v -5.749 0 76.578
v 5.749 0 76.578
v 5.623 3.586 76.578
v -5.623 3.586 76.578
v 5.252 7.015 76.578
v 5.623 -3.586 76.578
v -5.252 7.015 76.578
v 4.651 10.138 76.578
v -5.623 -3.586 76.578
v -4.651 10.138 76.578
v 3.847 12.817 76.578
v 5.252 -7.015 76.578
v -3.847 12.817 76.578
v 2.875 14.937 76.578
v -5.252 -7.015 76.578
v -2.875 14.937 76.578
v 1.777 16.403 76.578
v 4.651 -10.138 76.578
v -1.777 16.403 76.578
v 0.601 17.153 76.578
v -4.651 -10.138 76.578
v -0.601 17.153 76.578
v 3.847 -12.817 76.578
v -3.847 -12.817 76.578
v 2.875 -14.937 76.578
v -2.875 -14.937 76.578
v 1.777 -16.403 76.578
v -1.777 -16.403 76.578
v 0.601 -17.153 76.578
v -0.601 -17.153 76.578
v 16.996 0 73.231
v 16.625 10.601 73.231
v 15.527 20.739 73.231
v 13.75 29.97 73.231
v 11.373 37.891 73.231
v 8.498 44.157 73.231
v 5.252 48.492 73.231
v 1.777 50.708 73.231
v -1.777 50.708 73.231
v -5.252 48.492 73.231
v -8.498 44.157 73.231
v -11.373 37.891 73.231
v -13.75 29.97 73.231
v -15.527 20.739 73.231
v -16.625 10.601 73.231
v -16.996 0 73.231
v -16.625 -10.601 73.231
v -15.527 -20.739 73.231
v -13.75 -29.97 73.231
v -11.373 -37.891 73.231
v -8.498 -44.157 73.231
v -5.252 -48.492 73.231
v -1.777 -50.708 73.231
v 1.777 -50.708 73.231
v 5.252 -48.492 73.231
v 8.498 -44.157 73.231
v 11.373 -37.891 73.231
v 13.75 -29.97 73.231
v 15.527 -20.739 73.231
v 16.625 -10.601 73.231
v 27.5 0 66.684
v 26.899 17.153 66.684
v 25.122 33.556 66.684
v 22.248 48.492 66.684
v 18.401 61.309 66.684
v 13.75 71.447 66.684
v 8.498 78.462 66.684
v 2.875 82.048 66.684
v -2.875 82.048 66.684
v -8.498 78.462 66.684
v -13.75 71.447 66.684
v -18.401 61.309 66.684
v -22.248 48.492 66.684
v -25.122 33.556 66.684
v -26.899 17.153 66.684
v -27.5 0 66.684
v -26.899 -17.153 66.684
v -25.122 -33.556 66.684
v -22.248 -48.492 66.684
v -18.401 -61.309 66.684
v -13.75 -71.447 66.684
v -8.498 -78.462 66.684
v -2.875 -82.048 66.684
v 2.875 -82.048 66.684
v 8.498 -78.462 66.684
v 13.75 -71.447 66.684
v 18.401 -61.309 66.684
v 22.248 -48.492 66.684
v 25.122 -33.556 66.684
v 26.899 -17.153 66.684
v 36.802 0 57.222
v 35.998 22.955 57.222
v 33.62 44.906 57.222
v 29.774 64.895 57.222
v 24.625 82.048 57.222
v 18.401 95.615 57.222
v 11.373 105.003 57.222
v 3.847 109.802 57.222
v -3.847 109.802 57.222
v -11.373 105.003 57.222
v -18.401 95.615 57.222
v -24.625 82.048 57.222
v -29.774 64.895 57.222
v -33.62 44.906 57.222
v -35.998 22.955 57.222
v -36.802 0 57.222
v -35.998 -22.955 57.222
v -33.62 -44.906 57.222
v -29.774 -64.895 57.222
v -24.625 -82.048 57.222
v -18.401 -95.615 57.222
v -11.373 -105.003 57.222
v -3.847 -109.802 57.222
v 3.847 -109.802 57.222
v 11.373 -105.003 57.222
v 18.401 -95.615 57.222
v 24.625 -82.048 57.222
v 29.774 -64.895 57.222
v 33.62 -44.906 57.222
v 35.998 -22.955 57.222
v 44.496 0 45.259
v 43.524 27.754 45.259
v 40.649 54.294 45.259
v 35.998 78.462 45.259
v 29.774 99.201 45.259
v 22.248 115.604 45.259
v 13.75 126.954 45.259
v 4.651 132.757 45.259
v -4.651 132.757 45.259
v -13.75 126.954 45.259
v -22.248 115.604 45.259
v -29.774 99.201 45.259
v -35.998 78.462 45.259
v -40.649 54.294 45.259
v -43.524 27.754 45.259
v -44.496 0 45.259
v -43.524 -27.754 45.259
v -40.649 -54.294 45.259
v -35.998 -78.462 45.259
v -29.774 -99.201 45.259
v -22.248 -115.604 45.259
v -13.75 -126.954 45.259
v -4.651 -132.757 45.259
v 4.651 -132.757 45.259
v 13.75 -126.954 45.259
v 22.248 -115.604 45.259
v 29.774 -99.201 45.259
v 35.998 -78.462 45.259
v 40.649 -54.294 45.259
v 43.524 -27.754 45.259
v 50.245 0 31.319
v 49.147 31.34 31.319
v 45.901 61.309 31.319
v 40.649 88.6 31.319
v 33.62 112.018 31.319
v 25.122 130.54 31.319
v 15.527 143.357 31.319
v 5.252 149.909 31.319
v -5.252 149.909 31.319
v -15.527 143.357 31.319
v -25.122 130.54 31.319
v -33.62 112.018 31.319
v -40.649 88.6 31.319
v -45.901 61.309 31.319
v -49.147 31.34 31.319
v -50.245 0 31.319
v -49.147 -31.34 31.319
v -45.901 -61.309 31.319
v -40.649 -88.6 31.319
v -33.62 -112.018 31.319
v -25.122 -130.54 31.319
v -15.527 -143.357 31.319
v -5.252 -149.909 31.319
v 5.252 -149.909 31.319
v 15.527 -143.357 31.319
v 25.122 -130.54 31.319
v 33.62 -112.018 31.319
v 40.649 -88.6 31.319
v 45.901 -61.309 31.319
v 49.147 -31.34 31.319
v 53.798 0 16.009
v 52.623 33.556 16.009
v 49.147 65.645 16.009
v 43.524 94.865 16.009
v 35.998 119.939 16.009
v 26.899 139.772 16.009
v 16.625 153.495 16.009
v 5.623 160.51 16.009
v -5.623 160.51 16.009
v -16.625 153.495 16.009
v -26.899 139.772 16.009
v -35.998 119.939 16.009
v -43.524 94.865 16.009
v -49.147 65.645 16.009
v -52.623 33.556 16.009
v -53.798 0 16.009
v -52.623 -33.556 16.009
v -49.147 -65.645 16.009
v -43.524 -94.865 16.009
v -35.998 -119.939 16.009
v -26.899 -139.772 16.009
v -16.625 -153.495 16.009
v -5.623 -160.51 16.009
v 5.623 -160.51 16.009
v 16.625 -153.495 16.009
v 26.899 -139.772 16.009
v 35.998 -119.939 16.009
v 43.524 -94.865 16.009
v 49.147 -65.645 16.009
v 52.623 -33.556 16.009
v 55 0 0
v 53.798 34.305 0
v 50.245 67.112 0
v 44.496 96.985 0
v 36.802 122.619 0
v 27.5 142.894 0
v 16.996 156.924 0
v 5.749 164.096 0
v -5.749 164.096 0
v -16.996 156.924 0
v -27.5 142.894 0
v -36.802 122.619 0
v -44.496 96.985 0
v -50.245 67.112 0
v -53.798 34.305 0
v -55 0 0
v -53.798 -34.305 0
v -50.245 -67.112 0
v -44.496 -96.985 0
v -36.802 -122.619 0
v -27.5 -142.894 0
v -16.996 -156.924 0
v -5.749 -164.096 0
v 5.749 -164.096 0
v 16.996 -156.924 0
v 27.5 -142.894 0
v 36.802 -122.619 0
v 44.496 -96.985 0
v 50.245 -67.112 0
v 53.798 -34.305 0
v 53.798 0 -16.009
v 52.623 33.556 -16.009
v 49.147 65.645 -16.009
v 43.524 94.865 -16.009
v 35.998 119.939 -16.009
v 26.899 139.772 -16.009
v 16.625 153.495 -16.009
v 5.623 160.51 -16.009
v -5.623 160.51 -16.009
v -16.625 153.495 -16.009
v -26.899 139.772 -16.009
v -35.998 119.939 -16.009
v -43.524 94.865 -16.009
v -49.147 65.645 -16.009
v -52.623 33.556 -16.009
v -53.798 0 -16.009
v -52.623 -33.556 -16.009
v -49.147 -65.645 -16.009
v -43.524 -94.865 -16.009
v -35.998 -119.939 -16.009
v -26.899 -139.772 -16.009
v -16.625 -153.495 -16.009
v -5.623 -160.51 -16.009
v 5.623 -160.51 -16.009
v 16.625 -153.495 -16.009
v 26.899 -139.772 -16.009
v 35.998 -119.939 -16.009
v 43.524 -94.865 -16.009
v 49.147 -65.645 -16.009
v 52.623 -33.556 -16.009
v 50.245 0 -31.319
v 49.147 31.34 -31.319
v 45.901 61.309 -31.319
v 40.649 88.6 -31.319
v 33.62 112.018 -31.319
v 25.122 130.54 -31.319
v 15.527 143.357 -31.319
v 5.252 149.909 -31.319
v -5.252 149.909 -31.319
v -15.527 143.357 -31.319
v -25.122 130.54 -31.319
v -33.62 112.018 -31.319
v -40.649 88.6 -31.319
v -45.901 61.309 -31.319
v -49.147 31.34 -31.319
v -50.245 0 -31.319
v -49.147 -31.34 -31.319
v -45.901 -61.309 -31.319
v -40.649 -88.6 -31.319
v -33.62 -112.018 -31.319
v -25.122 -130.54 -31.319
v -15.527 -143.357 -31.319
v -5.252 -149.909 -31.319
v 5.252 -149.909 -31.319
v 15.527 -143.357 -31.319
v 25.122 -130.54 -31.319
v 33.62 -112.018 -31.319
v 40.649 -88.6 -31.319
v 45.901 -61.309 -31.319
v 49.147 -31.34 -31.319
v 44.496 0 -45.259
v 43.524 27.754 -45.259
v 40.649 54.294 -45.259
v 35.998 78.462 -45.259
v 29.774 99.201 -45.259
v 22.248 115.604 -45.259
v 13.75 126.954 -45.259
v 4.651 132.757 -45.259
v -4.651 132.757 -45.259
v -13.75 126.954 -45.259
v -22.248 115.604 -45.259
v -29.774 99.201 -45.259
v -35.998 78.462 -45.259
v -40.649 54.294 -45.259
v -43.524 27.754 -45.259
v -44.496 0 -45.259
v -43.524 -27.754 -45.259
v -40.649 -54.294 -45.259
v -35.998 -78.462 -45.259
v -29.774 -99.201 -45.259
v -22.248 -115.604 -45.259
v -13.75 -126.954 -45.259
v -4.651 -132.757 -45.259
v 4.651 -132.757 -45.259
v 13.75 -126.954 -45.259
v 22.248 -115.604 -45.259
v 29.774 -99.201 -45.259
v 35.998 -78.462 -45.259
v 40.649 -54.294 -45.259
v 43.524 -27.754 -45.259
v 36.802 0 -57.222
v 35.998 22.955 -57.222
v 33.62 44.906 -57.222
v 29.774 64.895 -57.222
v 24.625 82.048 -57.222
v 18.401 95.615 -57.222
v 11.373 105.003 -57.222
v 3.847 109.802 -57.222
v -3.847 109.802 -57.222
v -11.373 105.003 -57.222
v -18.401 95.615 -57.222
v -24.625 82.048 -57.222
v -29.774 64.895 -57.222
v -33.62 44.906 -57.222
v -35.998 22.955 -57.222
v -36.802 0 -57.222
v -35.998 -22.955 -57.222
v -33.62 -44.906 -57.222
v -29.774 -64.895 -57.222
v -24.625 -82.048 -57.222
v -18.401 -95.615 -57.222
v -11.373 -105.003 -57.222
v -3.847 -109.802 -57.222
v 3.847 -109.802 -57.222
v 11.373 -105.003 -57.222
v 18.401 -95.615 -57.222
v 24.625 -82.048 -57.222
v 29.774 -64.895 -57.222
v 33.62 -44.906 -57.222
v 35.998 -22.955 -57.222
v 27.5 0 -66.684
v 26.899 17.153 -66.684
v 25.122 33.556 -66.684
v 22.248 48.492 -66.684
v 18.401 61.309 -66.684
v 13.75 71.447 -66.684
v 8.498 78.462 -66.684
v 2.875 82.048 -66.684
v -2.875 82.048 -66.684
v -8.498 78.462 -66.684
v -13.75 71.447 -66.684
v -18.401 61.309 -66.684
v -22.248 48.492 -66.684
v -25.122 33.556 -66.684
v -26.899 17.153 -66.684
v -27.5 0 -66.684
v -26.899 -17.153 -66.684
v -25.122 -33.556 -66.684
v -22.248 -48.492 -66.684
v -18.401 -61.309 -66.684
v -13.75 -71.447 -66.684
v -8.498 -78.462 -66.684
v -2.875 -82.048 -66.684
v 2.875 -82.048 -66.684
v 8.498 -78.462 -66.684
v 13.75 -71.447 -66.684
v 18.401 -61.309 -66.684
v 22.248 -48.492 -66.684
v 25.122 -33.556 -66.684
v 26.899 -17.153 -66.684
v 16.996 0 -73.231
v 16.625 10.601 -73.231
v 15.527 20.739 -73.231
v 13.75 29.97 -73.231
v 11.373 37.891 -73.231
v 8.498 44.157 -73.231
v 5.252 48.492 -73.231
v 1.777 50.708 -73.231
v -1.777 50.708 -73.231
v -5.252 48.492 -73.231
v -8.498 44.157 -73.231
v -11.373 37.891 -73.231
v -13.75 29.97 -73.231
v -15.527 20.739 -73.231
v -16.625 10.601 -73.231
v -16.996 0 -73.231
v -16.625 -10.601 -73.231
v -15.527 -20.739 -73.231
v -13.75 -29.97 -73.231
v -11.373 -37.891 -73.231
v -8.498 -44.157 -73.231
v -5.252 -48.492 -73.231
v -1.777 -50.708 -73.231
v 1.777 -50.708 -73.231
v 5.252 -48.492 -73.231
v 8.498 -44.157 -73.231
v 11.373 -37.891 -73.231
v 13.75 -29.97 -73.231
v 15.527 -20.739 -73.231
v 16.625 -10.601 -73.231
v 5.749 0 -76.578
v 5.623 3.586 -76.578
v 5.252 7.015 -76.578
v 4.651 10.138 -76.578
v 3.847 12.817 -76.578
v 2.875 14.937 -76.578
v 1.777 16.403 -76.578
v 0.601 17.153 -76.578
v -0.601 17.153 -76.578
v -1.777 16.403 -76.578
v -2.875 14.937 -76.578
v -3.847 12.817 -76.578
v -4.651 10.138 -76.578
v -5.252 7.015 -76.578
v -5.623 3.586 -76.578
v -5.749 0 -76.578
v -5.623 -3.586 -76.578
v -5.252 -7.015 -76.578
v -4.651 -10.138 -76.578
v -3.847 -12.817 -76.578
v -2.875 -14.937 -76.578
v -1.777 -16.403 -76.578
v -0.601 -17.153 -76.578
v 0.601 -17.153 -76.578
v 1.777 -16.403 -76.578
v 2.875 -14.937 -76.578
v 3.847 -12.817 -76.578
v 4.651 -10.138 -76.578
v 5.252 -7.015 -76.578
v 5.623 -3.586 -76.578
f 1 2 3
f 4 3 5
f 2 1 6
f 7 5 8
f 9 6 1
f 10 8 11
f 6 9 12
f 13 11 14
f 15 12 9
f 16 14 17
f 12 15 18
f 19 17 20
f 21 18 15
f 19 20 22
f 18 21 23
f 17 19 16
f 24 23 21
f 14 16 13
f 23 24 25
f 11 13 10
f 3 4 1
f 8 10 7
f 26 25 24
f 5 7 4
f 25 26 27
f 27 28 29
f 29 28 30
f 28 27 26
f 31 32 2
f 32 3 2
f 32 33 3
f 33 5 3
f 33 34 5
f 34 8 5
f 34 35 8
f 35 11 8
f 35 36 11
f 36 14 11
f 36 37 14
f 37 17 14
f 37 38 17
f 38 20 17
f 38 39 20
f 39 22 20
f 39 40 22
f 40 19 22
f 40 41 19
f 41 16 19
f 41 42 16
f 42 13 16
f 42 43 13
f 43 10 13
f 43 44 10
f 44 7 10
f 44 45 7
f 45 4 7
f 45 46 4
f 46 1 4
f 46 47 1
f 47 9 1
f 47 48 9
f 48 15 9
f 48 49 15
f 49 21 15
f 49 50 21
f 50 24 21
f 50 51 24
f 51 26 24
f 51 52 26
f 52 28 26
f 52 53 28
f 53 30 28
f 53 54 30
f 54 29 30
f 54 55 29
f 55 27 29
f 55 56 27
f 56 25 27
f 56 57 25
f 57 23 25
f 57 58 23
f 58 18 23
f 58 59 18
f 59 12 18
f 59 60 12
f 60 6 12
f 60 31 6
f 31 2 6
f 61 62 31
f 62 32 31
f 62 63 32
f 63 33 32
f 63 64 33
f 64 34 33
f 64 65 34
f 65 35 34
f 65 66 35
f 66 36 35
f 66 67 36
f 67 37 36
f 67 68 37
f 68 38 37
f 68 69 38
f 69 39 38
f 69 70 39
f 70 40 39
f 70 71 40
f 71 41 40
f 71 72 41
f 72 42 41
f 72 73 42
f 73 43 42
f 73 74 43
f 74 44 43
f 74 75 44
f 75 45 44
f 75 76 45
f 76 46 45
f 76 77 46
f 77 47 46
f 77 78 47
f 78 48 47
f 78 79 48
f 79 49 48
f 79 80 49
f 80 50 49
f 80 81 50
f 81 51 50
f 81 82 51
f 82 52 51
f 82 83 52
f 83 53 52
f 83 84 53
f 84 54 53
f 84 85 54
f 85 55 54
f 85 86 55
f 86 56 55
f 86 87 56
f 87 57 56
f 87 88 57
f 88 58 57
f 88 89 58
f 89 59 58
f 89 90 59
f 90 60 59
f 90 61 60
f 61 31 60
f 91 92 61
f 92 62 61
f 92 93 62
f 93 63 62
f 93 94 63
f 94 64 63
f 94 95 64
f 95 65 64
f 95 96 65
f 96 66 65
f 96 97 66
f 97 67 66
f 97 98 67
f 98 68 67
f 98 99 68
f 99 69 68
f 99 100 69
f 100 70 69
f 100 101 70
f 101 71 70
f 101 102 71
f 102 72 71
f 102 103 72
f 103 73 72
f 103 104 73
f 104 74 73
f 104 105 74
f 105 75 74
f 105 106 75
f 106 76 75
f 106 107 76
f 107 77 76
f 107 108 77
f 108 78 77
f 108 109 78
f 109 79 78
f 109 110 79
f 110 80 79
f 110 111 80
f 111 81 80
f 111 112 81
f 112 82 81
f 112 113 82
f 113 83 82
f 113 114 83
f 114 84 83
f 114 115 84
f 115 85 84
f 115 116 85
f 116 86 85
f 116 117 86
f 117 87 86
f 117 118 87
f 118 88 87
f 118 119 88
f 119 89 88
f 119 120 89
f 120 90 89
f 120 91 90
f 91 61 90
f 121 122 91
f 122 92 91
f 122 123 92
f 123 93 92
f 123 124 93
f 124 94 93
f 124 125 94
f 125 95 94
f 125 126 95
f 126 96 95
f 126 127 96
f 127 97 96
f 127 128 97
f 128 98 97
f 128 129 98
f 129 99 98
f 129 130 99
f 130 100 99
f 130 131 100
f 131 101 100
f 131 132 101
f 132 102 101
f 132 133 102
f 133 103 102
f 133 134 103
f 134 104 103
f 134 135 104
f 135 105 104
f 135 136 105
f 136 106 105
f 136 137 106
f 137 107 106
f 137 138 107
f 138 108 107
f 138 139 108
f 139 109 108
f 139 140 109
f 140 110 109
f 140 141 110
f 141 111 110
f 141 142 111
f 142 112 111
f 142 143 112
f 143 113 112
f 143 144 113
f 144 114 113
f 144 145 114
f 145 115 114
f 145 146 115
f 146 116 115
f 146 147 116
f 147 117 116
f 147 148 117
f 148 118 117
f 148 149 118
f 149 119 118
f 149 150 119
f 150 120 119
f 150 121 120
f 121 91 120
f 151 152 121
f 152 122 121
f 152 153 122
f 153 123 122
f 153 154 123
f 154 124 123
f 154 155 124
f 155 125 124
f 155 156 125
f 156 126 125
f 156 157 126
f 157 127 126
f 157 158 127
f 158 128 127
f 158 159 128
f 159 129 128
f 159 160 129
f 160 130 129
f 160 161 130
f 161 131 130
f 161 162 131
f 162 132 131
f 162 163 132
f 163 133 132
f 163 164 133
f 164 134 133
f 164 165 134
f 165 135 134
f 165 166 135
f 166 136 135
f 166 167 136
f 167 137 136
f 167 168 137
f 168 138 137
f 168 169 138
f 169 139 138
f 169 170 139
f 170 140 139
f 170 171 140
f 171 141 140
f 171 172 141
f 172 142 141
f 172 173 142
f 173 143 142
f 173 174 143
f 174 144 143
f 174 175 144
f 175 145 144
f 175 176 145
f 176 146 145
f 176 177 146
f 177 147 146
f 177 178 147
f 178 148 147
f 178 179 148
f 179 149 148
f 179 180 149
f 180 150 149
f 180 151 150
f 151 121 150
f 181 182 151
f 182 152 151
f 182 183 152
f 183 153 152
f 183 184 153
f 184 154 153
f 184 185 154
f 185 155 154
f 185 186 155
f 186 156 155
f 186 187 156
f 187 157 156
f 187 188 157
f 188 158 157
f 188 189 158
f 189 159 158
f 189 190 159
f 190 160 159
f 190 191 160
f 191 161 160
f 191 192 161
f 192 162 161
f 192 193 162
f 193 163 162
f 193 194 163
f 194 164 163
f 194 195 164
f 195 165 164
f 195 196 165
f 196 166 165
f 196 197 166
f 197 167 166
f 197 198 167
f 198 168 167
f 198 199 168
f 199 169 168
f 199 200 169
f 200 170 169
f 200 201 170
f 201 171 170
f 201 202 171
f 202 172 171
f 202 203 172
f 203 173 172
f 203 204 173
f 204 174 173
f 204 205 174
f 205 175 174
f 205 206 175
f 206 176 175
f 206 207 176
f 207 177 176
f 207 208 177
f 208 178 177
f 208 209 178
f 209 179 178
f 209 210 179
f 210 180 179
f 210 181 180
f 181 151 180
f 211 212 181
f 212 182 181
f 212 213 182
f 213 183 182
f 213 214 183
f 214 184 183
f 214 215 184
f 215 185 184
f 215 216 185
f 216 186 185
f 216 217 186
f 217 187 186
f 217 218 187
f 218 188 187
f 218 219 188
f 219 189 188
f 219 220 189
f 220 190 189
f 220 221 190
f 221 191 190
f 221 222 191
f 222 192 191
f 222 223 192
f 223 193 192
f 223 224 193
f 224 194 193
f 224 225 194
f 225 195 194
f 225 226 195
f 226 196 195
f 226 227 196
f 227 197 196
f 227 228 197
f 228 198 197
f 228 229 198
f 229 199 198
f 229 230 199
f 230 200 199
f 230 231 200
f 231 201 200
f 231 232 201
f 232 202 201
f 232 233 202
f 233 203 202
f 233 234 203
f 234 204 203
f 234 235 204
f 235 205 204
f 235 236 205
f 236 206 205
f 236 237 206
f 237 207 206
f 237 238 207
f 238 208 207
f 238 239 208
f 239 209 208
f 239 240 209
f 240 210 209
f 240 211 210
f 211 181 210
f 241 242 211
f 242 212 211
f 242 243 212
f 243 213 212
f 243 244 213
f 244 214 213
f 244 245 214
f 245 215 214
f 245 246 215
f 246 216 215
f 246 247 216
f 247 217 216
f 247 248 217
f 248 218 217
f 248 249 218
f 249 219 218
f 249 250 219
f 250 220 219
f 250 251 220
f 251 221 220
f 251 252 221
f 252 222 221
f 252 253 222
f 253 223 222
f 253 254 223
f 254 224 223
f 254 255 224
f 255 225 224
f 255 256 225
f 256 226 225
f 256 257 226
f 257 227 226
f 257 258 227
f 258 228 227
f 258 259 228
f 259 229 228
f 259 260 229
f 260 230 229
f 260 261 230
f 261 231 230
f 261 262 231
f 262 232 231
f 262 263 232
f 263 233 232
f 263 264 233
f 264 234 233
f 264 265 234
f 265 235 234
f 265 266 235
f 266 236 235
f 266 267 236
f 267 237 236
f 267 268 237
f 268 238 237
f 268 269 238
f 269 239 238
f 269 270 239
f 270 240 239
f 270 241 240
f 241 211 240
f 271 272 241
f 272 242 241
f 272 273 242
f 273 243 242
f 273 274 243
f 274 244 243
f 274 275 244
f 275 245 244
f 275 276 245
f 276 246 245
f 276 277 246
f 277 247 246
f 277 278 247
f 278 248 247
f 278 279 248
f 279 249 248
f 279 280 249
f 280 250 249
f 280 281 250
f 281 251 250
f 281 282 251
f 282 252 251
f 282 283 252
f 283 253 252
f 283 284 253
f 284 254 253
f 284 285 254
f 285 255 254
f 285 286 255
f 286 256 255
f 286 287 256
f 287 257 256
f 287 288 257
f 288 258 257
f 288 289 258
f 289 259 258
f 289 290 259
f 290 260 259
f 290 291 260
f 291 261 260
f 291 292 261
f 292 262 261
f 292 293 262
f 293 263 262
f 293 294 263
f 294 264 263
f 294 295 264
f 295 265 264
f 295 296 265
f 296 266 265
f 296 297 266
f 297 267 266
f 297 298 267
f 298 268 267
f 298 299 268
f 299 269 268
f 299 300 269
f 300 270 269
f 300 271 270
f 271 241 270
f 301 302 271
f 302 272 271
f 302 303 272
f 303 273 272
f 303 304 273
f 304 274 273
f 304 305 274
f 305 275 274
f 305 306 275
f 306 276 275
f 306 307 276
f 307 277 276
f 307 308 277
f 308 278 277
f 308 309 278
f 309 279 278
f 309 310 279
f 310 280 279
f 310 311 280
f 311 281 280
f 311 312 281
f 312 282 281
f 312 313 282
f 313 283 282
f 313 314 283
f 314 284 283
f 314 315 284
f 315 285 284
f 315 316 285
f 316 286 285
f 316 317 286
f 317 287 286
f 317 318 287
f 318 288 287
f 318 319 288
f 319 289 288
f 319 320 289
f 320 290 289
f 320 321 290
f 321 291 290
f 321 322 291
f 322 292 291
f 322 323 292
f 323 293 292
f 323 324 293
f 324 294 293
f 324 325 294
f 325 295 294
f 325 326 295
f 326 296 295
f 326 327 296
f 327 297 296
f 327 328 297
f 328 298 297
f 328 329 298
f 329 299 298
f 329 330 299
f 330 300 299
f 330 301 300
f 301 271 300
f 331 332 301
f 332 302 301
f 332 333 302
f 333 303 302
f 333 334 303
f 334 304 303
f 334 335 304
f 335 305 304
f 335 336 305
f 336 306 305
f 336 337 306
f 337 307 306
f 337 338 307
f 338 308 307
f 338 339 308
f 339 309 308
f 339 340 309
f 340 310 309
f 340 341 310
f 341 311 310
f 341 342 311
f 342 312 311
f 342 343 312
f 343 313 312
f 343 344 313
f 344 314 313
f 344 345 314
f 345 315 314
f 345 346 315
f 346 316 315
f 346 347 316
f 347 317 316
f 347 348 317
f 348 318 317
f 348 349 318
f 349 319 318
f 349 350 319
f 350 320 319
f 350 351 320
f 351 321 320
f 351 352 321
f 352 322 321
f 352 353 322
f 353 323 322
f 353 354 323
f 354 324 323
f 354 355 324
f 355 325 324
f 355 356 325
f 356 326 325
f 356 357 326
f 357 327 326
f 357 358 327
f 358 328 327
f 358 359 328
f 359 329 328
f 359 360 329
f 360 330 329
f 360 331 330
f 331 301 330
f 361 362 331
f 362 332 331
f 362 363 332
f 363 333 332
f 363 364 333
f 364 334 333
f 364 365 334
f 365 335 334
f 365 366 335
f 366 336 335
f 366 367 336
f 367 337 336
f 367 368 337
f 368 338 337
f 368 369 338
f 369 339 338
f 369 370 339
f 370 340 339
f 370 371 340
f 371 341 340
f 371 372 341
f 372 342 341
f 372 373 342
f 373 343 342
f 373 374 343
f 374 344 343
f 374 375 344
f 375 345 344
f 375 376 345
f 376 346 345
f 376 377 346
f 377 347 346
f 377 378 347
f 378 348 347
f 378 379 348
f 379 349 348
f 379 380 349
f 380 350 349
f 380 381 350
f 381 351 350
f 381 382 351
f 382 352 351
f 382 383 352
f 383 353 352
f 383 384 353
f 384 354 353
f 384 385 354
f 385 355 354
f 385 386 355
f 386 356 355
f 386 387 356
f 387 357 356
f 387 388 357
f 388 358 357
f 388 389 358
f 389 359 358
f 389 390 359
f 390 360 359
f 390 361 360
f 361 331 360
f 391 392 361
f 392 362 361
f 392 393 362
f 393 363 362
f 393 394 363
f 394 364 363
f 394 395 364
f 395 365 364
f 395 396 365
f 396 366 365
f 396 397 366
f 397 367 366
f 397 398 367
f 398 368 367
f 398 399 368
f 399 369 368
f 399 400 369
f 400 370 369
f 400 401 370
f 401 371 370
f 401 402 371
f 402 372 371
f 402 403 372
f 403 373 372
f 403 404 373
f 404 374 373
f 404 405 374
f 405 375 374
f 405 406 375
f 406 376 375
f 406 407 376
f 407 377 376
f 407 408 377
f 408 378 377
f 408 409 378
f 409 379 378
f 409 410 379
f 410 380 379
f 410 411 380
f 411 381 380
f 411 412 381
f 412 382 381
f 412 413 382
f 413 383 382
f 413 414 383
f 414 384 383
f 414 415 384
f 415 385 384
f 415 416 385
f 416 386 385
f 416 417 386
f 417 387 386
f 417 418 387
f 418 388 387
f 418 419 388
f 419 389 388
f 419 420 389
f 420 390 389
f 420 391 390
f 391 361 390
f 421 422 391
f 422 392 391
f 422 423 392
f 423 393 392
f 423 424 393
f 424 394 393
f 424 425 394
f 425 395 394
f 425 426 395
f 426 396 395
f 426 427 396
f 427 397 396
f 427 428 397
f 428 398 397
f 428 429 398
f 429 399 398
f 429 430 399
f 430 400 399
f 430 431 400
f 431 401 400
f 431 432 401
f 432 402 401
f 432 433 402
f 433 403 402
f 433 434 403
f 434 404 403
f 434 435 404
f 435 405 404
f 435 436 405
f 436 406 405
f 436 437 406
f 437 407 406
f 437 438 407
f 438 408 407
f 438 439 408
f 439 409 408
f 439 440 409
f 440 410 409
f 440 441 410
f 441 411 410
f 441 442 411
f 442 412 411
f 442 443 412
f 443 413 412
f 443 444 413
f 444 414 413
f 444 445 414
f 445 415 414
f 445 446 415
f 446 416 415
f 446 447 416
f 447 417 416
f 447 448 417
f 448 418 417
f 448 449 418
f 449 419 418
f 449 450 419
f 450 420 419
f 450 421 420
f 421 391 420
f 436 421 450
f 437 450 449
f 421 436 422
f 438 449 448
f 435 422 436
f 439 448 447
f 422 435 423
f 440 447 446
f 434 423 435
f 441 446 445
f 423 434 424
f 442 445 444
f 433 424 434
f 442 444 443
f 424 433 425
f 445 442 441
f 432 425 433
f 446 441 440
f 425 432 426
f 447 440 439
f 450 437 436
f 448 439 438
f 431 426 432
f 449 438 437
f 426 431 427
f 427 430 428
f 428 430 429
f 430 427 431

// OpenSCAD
// Generated by SolidPython 1.0.1 on 2020-07-29 00:46:46


scale(v = [5, 15, 7]) {
	sphere(r = 11);
}
/***********************************************
*********      SolidPython code:      **********
************************************************
 
# import packages: SolidPython
from solid import *
from solid.utils import *
from itertools import chain, combinations, permutations


class Resize:

    def __init__(self, scad_file):
        self.scad_file = scad_file
        #self.scad_file = import_scad(scad_file)
        # cone/cylinder param:
        self.r1 = 0
        self.r2 = 0
        self.h = 0
        # rectangular prism param:
        self.w = 0
        self.l = 0
        # ellipse param:
        self.r = 0

    # import OpenScad code (file name corresponds to shape)


    # classify shape + parameters
    def assign(self, param1, param2, param3):
        if self.scad_file == 'cone.scad':
            self.r1 = param1
            self.r2 = param2
            self.h = param3
        elif self.scad_file == 'cylinder.scad':
            self.r1 = param1
            self.r2 = param2
            self.h = param3
        elif self.scad_file == 'rectangularPrism.scad':
            self.h = param1
            self.l = param2
            self.w = param3
        else:
            self.r = param1
            self.h = param2

    # resize parameters
    def iterate(self):
        x = range(3, 20, 2)
        i = 1
        if self.scad_file == 'cone.scad':
            tempList = list(permutations(x, 2))
            for temp in tempList:
                param1 = temp[0]
                param2 = temp[1]
                filepath = 'produced_scad_files/' + 'cone' + str(param1) + '_' + str(param2) + '_' + '.scad'
                scad_render_to_file(cylinder(h=param1, r1=param2, r2=0), filepath)

        elif self.scad_file == 'cylinder.scad':
            tempList = list(permutations(x, 3))
            for temp in tempList:
                param1 = temp[0]
                param2 = temp[1]
                filepath = 'produced_scad_files/' + 'cylinder' + str(param1) + '_' + str(param2) + '_' + '.scad'
                scad_render_to_file(cylinder(h=param1, r1=param2, r2=param2), filepath)

        elif self.scad_file == 'rectangularPrism.scad':
            tempList = list(permutations(x, 3))
            for temp in tempList:
                param1 = temp[0]
                param2 = temp[1]
                param3 = temp[2]
                filepath = 'produced_scad_files/' + 'rectangularPrism' + str(param1) + '_' + str(param2) + '_' + str(
                    param3) + '.scad'
                scad_render_to_file(cube(size=(param1, param2, param3)), filepath)

        elif self.scad_file == 'ellipse.scad':
            tempList = list(permutations(x, 4))
            for temp in tempList:
                param1 = temp[0]
                param2 = temp[1]
                param3 = temp[2]
                param4 = temp[3]
                filepath = 'produced_scad_files/' + 'ellipse' + str(param1) + '_' + str(param2) + '_' + str(param3) + '_' + str(param4) + '.scad'
                scad_render_to_file(scale([param1, param2, param3])(sphere(r=param4)), filepath)

    def render_to_scadfile(self):
        scad_render_to_file(scad, 'example.scad') 
 
************************************************/
